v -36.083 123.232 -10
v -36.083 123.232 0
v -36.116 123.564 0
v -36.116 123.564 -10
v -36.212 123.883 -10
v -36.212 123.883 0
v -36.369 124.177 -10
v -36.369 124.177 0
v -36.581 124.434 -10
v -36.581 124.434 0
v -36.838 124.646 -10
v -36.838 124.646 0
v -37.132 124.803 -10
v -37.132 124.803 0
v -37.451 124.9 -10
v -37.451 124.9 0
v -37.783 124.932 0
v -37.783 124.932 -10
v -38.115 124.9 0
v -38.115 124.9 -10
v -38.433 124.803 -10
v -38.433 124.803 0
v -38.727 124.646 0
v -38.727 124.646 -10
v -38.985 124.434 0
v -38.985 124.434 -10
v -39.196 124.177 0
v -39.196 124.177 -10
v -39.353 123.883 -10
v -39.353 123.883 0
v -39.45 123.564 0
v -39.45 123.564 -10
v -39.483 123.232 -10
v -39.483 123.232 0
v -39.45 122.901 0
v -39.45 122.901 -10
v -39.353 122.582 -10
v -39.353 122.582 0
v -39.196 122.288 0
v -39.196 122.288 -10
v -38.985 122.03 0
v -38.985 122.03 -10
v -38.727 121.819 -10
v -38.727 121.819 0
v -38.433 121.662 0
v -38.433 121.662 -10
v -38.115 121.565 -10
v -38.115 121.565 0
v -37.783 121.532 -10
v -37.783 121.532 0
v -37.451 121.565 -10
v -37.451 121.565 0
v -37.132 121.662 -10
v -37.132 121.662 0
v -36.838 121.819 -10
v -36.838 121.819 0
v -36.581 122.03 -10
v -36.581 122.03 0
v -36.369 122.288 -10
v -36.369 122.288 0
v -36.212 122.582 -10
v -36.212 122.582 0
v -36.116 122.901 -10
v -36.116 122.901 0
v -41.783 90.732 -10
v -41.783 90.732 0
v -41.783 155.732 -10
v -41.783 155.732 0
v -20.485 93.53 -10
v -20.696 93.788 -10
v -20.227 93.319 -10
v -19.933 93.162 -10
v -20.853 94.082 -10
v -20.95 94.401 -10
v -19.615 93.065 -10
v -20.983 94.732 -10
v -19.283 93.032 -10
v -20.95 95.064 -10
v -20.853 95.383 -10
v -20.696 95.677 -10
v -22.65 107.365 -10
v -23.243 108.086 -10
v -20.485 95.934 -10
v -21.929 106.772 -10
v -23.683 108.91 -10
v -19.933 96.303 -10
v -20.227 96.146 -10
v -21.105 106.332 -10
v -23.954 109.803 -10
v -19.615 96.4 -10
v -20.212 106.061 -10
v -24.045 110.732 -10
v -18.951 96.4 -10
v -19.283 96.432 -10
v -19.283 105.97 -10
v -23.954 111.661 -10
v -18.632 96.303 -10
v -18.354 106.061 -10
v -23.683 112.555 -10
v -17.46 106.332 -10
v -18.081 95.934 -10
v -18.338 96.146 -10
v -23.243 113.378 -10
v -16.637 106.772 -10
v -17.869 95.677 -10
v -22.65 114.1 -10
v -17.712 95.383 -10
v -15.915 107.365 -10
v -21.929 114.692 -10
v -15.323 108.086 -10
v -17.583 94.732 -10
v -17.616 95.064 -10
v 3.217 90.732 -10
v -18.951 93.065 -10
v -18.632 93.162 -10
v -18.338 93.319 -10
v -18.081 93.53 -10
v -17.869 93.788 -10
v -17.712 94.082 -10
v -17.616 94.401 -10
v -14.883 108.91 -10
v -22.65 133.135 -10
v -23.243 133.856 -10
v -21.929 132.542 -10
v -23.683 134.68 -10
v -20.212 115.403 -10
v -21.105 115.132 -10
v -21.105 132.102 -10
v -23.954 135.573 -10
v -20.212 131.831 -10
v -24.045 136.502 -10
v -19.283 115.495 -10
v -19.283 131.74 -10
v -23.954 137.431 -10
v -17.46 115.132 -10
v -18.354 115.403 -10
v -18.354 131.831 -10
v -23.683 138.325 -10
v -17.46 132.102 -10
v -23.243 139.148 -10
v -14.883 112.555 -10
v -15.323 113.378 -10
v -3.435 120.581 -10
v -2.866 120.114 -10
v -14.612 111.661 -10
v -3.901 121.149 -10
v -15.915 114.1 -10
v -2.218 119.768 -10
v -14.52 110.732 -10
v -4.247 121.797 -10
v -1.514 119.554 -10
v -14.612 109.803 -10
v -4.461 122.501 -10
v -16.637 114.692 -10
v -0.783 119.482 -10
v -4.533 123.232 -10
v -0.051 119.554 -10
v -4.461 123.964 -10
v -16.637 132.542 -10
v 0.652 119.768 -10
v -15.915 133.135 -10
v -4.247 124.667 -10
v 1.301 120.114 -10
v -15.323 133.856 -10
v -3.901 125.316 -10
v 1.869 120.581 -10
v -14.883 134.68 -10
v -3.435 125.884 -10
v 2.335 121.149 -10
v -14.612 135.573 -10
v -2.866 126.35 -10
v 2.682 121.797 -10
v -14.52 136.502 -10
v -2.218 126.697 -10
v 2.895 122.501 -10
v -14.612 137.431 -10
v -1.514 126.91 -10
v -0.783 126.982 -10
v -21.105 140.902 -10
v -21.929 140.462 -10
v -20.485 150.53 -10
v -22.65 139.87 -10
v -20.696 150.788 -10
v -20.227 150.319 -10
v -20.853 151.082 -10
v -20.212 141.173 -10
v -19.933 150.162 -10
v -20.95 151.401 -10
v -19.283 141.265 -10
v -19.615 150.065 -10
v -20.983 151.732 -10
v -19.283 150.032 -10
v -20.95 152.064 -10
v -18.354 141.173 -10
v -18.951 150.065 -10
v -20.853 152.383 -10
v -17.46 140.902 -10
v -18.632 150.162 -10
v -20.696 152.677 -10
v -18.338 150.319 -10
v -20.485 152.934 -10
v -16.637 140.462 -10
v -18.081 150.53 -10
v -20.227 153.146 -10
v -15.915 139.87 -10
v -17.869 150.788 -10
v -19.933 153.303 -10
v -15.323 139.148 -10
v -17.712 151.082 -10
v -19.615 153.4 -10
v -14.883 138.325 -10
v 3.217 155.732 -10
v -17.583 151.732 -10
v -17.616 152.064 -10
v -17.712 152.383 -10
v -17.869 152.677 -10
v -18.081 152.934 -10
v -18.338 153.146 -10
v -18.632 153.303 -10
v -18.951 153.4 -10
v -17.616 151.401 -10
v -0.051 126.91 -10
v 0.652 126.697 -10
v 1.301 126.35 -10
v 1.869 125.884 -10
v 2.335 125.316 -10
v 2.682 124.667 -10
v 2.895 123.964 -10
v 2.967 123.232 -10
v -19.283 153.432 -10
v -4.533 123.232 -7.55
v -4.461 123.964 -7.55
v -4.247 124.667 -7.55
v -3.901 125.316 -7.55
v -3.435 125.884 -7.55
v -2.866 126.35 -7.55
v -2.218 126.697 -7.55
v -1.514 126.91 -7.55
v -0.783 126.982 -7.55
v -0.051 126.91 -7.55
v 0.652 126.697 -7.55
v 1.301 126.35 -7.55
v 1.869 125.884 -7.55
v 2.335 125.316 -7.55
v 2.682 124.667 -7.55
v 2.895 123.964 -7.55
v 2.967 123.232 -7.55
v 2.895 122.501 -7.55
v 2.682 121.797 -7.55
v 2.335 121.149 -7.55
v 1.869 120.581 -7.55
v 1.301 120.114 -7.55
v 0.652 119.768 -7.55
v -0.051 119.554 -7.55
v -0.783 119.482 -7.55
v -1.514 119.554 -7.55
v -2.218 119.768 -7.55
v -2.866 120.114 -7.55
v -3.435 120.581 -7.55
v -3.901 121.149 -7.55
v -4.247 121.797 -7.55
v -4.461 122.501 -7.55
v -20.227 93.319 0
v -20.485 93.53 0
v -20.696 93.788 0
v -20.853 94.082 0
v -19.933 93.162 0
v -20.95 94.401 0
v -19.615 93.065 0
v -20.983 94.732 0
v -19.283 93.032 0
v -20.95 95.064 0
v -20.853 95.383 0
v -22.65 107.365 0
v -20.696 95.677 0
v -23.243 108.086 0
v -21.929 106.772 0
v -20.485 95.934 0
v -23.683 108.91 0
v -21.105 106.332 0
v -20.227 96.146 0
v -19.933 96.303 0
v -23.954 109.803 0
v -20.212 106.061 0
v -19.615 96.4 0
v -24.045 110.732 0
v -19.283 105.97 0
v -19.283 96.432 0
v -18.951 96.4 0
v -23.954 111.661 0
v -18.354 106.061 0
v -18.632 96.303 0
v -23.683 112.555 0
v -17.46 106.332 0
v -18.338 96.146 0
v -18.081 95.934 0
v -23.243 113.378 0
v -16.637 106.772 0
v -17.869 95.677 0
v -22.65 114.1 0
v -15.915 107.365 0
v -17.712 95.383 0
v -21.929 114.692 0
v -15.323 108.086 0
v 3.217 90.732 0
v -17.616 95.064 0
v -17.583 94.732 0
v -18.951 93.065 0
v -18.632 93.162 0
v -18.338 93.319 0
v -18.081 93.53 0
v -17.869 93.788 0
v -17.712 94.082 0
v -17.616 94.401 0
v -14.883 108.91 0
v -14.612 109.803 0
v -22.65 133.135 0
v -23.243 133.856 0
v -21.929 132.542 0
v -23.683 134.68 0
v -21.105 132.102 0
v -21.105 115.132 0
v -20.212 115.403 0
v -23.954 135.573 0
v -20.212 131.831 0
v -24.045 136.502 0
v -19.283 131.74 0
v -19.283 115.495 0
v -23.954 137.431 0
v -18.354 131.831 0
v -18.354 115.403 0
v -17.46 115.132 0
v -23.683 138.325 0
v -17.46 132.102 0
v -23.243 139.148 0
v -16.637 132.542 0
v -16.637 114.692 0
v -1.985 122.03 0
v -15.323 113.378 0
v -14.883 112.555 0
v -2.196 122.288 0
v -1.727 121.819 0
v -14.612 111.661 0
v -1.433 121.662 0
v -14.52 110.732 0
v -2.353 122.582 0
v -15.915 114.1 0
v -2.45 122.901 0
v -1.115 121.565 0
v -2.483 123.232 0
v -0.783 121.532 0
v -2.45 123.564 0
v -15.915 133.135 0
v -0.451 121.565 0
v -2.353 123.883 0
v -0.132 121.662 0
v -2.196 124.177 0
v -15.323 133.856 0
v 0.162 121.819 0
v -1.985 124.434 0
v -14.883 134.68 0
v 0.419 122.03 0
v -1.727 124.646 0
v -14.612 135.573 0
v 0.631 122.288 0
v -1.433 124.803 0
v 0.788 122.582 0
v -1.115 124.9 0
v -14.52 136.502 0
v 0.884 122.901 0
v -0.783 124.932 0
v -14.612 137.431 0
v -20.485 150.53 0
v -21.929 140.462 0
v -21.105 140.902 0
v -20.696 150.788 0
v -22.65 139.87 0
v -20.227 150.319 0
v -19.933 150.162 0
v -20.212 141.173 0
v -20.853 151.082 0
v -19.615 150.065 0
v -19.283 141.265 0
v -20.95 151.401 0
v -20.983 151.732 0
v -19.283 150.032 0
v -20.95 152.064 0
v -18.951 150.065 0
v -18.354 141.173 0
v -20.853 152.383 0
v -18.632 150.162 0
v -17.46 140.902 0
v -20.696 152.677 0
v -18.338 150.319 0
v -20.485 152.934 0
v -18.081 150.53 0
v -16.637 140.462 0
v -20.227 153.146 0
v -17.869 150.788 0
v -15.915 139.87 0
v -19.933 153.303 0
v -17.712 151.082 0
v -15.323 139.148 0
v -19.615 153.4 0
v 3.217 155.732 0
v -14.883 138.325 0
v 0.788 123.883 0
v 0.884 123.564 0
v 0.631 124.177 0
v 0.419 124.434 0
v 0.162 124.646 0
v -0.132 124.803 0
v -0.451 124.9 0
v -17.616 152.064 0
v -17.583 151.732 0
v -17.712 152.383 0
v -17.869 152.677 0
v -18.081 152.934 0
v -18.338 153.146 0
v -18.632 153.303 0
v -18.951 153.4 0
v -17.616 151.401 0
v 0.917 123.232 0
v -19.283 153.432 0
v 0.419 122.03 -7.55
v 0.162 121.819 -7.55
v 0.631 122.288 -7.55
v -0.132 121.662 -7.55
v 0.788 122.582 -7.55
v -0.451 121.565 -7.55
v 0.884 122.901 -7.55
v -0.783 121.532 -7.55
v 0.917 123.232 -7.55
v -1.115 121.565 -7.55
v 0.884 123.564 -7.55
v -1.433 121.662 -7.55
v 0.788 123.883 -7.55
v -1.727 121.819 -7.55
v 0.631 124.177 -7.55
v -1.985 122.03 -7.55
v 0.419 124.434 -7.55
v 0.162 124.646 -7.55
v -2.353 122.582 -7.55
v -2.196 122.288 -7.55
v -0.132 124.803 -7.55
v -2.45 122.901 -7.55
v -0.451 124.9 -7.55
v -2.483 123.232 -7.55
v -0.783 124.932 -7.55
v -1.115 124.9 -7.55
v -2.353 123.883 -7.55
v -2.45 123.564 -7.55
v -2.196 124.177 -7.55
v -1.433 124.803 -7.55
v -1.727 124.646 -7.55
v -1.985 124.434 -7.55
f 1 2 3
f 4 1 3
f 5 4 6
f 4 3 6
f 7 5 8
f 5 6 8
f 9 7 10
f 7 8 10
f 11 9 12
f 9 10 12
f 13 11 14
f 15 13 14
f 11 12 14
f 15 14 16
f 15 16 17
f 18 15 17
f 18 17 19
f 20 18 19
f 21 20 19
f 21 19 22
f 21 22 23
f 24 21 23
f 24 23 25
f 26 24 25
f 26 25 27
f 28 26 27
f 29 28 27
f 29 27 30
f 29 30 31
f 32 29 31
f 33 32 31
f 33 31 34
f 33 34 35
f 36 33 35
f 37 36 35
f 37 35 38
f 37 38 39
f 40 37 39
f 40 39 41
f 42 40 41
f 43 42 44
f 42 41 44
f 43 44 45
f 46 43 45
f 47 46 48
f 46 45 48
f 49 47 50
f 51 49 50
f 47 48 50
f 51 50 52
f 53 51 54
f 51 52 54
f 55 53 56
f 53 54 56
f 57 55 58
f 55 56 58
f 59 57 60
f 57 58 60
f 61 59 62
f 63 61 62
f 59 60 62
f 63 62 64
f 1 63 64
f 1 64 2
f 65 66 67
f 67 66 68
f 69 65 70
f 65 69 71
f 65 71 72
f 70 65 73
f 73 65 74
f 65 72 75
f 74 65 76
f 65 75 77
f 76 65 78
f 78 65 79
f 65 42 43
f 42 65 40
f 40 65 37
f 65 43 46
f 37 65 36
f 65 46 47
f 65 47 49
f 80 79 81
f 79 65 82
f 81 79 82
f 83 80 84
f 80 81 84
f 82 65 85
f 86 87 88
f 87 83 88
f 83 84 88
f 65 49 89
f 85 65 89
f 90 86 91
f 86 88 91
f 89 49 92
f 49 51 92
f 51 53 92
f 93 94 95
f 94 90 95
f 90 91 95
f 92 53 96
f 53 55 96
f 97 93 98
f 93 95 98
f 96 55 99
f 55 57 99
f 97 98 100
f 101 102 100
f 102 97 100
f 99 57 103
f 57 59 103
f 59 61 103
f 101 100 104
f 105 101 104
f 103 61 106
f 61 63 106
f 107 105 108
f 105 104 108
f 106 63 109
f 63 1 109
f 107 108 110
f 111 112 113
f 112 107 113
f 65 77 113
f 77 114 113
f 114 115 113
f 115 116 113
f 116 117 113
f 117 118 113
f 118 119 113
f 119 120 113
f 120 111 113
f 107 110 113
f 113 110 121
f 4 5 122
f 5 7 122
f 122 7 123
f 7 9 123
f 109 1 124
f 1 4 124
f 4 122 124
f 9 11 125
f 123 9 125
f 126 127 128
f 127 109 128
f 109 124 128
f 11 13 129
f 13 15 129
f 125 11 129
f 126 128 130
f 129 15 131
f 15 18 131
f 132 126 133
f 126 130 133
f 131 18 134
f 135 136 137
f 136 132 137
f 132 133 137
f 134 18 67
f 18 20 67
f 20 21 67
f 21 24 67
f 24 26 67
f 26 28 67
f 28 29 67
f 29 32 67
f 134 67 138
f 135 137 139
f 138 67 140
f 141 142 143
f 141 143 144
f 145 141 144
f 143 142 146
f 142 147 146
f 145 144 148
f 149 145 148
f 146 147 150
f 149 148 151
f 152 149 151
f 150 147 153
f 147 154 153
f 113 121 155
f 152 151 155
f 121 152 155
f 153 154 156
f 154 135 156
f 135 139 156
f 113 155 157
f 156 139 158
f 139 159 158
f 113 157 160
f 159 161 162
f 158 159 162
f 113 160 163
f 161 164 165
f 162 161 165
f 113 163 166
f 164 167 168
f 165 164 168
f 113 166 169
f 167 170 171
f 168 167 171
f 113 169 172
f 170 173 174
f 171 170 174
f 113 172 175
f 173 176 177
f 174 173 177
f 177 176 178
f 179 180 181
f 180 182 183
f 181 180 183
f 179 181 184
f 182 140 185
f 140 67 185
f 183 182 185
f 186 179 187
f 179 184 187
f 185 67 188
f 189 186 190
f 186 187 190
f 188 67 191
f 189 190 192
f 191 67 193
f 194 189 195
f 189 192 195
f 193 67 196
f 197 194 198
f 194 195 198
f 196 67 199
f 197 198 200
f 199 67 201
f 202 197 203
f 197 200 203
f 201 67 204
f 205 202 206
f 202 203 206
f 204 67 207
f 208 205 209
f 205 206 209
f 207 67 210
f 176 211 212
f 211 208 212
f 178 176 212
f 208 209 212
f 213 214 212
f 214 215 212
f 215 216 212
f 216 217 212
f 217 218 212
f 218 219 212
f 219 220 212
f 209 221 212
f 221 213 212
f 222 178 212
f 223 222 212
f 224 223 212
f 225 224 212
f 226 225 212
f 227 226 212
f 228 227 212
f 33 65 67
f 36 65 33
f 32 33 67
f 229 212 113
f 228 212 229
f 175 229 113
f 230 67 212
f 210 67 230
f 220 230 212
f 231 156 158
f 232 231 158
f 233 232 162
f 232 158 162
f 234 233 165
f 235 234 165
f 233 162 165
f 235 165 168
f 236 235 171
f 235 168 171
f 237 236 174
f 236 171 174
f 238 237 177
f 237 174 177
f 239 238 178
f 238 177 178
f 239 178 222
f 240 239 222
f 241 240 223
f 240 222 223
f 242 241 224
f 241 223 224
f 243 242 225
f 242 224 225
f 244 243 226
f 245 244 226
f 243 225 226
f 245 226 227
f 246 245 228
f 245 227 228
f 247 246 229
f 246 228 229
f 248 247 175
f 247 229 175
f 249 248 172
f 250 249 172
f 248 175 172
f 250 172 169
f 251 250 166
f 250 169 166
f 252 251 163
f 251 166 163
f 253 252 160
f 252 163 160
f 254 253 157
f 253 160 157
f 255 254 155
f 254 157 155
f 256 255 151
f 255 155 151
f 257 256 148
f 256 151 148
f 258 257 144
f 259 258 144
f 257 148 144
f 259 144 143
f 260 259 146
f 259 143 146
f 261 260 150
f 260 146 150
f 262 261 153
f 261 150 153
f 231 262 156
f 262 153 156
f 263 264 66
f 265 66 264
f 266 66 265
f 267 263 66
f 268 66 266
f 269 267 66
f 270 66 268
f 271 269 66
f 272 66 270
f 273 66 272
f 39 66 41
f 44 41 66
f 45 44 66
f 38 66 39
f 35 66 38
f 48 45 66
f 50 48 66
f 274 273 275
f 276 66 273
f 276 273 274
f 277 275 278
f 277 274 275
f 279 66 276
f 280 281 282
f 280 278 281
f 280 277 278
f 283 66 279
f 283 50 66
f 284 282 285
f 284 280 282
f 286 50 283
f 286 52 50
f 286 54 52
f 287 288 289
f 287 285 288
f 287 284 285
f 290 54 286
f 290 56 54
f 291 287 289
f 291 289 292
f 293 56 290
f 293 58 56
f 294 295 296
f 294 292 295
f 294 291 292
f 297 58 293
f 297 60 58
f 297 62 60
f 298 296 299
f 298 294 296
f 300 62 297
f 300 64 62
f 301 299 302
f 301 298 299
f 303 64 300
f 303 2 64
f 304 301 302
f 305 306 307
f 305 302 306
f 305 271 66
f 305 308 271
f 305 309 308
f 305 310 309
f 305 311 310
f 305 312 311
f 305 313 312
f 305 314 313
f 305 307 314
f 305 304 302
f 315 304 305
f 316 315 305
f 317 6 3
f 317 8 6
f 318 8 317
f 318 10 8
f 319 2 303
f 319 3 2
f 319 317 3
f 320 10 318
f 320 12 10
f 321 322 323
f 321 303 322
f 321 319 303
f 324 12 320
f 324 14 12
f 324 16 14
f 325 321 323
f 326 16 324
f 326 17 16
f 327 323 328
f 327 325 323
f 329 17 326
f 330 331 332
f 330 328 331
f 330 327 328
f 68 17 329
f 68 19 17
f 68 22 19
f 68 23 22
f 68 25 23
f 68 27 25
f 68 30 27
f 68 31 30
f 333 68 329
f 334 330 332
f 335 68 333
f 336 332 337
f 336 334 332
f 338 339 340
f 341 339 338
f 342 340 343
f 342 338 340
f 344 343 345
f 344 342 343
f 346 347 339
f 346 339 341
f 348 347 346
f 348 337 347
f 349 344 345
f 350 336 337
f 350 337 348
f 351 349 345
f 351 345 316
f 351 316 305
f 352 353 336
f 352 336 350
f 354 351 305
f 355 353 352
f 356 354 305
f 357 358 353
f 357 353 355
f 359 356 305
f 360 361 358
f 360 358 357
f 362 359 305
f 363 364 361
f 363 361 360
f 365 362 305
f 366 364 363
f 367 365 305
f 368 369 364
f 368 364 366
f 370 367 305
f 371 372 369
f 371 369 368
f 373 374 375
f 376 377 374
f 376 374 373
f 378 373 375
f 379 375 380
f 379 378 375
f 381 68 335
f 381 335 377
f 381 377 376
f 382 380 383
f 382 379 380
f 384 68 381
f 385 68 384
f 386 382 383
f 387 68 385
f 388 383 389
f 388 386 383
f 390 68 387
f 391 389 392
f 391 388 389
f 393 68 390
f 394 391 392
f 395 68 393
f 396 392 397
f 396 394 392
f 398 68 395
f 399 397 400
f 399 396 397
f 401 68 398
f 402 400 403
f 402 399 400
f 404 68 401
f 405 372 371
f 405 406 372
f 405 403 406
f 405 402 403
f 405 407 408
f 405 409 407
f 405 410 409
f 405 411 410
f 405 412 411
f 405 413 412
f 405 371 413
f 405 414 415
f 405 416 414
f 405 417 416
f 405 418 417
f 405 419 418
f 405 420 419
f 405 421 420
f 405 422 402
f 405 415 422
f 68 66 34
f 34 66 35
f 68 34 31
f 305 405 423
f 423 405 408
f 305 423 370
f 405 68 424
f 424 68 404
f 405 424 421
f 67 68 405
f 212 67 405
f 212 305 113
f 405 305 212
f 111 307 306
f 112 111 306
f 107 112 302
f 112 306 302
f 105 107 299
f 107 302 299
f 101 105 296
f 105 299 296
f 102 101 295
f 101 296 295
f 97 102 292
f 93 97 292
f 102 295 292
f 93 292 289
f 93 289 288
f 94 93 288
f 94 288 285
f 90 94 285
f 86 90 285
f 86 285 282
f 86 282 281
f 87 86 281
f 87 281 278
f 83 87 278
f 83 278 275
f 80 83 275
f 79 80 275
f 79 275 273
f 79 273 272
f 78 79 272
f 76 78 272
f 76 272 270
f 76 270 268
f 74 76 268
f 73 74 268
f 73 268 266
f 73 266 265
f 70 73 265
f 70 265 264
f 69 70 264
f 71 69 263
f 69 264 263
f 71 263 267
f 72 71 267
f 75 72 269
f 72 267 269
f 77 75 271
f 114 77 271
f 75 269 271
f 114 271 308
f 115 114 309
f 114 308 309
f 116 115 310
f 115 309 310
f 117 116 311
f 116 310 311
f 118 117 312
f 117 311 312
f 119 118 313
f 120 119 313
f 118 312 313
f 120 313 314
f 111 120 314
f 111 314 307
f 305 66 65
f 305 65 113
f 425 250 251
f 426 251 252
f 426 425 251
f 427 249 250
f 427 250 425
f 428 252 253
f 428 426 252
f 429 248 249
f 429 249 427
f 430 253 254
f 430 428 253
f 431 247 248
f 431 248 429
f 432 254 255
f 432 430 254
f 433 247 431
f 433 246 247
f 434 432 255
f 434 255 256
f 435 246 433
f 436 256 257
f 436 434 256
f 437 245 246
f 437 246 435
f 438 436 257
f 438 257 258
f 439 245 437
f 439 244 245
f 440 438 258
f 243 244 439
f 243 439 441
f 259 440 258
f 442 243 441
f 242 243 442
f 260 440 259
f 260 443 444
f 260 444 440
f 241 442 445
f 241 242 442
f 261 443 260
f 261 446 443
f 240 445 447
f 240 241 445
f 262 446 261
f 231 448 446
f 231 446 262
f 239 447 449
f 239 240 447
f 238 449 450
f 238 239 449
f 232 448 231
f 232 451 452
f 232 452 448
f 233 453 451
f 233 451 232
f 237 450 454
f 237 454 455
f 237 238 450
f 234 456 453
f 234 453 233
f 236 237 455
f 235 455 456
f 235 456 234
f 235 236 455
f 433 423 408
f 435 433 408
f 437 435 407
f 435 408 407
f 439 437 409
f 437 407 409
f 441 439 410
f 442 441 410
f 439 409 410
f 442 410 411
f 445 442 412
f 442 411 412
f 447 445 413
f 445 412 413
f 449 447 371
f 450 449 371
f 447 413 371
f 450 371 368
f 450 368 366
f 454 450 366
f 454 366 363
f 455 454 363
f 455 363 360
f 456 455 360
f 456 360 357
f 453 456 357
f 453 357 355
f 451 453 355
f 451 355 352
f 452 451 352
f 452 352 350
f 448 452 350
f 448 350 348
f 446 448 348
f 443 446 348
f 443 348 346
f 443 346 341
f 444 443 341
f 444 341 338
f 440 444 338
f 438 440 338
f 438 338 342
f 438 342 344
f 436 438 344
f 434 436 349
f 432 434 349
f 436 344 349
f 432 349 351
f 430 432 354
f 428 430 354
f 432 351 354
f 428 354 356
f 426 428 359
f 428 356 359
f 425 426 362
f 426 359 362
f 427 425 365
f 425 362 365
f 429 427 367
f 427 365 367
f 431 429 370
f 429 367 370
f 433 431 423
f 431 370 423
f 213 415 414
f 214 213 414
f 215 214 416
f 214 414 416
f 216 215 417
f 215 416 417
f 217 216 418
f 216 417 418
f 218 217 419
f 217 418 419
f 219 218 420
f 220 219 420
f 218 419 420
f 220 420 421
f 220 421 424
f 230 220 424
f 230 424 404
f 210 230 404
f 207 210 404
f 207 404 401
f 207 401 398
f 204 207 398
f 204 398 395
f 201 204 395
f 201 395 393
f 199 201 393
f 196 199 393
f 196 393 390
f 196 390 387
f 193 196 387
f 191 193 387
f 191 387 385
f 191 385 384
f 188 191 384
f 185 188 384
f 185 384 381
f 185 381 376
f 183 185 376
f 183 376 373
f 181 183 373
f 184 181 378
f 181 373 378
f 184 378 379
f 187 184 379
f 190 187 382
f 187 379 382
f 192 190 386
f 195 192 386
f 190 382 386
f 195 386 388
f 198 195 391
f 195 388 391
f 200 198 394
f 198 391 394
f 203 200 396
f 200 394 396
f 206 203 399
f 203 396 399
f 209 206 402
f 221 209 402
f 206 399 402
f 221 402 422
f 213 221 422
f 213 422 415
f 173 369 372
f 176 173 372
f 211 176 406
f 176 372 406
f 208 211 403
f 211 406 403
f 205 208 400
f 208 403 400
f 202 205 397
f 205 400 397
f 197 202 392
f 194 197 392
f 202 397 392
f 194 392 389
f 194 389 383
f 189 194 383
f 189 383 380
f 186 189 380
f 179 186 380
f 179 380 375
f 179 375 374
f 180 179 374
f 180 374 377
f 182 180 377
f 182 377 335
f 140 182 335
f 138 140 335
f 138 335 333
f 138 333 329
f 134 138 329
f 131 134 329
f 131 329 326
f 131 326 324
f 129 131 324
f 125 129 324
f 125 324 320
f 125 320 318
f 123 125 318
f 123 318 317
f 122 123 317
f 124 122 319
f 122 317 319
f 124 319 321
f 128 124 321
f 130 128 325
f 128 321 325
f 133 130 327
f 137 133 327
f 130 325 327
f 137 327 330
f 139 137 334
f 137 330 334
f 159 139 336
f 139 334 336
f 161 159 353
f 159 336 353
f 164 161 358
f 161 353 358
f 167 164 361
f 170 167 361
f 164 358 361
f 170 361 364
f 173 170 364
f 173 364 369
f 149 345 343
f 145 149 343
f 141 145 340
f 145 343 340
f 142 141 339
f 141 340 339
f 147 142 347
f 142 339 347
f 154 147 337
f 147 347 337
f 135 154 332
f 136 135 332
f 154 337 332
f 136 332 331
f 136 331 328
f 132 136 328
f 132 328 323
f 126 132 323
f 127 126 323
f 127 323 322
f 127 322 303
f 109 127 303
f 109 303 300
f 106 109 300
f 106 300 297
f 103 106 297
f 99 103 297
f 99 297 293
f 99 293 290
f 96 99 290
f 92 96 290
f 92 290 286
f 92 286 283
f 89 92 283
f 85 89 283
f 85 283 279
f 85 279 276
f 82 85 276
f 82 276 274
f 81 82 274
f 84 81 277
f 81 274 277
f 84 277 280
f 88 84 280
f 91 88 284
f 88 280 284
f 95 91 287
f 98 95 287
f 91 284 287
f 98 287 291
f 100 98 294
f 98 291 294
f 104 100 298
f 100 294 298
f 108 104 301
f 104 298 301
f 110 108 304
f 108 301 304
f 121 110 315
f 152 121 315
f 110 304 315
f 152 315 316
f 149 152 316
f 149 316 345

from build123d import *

# Parameters (mm, degrees)
ESBO_O2_W                = 45
ESBO_O2_H                = 65
RESSALTO_EXTRUS_O2_DEPTH = 10
ESBO_O3_R                = 4.7625
CORTE_EXTRUS_O1_DEPTH    = 162.549920911
FURO_COM_FOLGA_DE_M31_D  = 3.4
ESBO_O6_R                = 3.75
CORTE_EXTRUS_O2_DEPTH    = 2.45


with BuildPart() as part:
    # Esboço2 → Ressalto-extrusão2 (new body)
    with BuildSketch(Plane.XY):
        with Locations((-19.282851211, 123.232367513)):
            Rectangle(ESBO_O2_W, ESBO_O2_H)
    extrude(amount=-RESSALTO_EXTRUS_O2_DEPTH)

    # Esboço3 → Corte-extrusão1 (cut, through all)
    with BuildSketch(Plane.XY):
        with Locations((-19.282851211, 136.502367513)):
            Circle(ESBO_O3_R)
        with Locations((-19.282851211, 110.732367513)):
            Circle(ESBO_O3_R)
    extrude(amount=-CORTE_EXTRUS_O1_DEPTH, mode=Mode.SUBTRACT)

    # Furo com folga de M31 (through all)
    with Locations(Plane(origin=(0.160463456, 1.173491391, -10), x_dir=(-1, 0, 0), z_dir=(0, 0, -1))):
        with Locations((19.443314667, 93.558876122), (19.443314667, 150.558876122), (0.943314667, 122.058876122), (37.943314667, 122.058876122)):
            Hole(FURO_COM_FOLGA_DE_M31_D / 2)

    # Esboço6 → Corte-extrusão2 (cut)
    with BuildSketch(Plane(origin=(0, 0, -10), x_dir=(-1, 0, 0), z_dir=(0, 0, -1))):
        with Locations((0.782851211, 123.232367513)):
            Circle(ESBO_O6_R)
    extrude(amount=-CORTE_EXTRUS_O2_DEPTH, mode=Mode.SUBTRACT)


solid = part.part
